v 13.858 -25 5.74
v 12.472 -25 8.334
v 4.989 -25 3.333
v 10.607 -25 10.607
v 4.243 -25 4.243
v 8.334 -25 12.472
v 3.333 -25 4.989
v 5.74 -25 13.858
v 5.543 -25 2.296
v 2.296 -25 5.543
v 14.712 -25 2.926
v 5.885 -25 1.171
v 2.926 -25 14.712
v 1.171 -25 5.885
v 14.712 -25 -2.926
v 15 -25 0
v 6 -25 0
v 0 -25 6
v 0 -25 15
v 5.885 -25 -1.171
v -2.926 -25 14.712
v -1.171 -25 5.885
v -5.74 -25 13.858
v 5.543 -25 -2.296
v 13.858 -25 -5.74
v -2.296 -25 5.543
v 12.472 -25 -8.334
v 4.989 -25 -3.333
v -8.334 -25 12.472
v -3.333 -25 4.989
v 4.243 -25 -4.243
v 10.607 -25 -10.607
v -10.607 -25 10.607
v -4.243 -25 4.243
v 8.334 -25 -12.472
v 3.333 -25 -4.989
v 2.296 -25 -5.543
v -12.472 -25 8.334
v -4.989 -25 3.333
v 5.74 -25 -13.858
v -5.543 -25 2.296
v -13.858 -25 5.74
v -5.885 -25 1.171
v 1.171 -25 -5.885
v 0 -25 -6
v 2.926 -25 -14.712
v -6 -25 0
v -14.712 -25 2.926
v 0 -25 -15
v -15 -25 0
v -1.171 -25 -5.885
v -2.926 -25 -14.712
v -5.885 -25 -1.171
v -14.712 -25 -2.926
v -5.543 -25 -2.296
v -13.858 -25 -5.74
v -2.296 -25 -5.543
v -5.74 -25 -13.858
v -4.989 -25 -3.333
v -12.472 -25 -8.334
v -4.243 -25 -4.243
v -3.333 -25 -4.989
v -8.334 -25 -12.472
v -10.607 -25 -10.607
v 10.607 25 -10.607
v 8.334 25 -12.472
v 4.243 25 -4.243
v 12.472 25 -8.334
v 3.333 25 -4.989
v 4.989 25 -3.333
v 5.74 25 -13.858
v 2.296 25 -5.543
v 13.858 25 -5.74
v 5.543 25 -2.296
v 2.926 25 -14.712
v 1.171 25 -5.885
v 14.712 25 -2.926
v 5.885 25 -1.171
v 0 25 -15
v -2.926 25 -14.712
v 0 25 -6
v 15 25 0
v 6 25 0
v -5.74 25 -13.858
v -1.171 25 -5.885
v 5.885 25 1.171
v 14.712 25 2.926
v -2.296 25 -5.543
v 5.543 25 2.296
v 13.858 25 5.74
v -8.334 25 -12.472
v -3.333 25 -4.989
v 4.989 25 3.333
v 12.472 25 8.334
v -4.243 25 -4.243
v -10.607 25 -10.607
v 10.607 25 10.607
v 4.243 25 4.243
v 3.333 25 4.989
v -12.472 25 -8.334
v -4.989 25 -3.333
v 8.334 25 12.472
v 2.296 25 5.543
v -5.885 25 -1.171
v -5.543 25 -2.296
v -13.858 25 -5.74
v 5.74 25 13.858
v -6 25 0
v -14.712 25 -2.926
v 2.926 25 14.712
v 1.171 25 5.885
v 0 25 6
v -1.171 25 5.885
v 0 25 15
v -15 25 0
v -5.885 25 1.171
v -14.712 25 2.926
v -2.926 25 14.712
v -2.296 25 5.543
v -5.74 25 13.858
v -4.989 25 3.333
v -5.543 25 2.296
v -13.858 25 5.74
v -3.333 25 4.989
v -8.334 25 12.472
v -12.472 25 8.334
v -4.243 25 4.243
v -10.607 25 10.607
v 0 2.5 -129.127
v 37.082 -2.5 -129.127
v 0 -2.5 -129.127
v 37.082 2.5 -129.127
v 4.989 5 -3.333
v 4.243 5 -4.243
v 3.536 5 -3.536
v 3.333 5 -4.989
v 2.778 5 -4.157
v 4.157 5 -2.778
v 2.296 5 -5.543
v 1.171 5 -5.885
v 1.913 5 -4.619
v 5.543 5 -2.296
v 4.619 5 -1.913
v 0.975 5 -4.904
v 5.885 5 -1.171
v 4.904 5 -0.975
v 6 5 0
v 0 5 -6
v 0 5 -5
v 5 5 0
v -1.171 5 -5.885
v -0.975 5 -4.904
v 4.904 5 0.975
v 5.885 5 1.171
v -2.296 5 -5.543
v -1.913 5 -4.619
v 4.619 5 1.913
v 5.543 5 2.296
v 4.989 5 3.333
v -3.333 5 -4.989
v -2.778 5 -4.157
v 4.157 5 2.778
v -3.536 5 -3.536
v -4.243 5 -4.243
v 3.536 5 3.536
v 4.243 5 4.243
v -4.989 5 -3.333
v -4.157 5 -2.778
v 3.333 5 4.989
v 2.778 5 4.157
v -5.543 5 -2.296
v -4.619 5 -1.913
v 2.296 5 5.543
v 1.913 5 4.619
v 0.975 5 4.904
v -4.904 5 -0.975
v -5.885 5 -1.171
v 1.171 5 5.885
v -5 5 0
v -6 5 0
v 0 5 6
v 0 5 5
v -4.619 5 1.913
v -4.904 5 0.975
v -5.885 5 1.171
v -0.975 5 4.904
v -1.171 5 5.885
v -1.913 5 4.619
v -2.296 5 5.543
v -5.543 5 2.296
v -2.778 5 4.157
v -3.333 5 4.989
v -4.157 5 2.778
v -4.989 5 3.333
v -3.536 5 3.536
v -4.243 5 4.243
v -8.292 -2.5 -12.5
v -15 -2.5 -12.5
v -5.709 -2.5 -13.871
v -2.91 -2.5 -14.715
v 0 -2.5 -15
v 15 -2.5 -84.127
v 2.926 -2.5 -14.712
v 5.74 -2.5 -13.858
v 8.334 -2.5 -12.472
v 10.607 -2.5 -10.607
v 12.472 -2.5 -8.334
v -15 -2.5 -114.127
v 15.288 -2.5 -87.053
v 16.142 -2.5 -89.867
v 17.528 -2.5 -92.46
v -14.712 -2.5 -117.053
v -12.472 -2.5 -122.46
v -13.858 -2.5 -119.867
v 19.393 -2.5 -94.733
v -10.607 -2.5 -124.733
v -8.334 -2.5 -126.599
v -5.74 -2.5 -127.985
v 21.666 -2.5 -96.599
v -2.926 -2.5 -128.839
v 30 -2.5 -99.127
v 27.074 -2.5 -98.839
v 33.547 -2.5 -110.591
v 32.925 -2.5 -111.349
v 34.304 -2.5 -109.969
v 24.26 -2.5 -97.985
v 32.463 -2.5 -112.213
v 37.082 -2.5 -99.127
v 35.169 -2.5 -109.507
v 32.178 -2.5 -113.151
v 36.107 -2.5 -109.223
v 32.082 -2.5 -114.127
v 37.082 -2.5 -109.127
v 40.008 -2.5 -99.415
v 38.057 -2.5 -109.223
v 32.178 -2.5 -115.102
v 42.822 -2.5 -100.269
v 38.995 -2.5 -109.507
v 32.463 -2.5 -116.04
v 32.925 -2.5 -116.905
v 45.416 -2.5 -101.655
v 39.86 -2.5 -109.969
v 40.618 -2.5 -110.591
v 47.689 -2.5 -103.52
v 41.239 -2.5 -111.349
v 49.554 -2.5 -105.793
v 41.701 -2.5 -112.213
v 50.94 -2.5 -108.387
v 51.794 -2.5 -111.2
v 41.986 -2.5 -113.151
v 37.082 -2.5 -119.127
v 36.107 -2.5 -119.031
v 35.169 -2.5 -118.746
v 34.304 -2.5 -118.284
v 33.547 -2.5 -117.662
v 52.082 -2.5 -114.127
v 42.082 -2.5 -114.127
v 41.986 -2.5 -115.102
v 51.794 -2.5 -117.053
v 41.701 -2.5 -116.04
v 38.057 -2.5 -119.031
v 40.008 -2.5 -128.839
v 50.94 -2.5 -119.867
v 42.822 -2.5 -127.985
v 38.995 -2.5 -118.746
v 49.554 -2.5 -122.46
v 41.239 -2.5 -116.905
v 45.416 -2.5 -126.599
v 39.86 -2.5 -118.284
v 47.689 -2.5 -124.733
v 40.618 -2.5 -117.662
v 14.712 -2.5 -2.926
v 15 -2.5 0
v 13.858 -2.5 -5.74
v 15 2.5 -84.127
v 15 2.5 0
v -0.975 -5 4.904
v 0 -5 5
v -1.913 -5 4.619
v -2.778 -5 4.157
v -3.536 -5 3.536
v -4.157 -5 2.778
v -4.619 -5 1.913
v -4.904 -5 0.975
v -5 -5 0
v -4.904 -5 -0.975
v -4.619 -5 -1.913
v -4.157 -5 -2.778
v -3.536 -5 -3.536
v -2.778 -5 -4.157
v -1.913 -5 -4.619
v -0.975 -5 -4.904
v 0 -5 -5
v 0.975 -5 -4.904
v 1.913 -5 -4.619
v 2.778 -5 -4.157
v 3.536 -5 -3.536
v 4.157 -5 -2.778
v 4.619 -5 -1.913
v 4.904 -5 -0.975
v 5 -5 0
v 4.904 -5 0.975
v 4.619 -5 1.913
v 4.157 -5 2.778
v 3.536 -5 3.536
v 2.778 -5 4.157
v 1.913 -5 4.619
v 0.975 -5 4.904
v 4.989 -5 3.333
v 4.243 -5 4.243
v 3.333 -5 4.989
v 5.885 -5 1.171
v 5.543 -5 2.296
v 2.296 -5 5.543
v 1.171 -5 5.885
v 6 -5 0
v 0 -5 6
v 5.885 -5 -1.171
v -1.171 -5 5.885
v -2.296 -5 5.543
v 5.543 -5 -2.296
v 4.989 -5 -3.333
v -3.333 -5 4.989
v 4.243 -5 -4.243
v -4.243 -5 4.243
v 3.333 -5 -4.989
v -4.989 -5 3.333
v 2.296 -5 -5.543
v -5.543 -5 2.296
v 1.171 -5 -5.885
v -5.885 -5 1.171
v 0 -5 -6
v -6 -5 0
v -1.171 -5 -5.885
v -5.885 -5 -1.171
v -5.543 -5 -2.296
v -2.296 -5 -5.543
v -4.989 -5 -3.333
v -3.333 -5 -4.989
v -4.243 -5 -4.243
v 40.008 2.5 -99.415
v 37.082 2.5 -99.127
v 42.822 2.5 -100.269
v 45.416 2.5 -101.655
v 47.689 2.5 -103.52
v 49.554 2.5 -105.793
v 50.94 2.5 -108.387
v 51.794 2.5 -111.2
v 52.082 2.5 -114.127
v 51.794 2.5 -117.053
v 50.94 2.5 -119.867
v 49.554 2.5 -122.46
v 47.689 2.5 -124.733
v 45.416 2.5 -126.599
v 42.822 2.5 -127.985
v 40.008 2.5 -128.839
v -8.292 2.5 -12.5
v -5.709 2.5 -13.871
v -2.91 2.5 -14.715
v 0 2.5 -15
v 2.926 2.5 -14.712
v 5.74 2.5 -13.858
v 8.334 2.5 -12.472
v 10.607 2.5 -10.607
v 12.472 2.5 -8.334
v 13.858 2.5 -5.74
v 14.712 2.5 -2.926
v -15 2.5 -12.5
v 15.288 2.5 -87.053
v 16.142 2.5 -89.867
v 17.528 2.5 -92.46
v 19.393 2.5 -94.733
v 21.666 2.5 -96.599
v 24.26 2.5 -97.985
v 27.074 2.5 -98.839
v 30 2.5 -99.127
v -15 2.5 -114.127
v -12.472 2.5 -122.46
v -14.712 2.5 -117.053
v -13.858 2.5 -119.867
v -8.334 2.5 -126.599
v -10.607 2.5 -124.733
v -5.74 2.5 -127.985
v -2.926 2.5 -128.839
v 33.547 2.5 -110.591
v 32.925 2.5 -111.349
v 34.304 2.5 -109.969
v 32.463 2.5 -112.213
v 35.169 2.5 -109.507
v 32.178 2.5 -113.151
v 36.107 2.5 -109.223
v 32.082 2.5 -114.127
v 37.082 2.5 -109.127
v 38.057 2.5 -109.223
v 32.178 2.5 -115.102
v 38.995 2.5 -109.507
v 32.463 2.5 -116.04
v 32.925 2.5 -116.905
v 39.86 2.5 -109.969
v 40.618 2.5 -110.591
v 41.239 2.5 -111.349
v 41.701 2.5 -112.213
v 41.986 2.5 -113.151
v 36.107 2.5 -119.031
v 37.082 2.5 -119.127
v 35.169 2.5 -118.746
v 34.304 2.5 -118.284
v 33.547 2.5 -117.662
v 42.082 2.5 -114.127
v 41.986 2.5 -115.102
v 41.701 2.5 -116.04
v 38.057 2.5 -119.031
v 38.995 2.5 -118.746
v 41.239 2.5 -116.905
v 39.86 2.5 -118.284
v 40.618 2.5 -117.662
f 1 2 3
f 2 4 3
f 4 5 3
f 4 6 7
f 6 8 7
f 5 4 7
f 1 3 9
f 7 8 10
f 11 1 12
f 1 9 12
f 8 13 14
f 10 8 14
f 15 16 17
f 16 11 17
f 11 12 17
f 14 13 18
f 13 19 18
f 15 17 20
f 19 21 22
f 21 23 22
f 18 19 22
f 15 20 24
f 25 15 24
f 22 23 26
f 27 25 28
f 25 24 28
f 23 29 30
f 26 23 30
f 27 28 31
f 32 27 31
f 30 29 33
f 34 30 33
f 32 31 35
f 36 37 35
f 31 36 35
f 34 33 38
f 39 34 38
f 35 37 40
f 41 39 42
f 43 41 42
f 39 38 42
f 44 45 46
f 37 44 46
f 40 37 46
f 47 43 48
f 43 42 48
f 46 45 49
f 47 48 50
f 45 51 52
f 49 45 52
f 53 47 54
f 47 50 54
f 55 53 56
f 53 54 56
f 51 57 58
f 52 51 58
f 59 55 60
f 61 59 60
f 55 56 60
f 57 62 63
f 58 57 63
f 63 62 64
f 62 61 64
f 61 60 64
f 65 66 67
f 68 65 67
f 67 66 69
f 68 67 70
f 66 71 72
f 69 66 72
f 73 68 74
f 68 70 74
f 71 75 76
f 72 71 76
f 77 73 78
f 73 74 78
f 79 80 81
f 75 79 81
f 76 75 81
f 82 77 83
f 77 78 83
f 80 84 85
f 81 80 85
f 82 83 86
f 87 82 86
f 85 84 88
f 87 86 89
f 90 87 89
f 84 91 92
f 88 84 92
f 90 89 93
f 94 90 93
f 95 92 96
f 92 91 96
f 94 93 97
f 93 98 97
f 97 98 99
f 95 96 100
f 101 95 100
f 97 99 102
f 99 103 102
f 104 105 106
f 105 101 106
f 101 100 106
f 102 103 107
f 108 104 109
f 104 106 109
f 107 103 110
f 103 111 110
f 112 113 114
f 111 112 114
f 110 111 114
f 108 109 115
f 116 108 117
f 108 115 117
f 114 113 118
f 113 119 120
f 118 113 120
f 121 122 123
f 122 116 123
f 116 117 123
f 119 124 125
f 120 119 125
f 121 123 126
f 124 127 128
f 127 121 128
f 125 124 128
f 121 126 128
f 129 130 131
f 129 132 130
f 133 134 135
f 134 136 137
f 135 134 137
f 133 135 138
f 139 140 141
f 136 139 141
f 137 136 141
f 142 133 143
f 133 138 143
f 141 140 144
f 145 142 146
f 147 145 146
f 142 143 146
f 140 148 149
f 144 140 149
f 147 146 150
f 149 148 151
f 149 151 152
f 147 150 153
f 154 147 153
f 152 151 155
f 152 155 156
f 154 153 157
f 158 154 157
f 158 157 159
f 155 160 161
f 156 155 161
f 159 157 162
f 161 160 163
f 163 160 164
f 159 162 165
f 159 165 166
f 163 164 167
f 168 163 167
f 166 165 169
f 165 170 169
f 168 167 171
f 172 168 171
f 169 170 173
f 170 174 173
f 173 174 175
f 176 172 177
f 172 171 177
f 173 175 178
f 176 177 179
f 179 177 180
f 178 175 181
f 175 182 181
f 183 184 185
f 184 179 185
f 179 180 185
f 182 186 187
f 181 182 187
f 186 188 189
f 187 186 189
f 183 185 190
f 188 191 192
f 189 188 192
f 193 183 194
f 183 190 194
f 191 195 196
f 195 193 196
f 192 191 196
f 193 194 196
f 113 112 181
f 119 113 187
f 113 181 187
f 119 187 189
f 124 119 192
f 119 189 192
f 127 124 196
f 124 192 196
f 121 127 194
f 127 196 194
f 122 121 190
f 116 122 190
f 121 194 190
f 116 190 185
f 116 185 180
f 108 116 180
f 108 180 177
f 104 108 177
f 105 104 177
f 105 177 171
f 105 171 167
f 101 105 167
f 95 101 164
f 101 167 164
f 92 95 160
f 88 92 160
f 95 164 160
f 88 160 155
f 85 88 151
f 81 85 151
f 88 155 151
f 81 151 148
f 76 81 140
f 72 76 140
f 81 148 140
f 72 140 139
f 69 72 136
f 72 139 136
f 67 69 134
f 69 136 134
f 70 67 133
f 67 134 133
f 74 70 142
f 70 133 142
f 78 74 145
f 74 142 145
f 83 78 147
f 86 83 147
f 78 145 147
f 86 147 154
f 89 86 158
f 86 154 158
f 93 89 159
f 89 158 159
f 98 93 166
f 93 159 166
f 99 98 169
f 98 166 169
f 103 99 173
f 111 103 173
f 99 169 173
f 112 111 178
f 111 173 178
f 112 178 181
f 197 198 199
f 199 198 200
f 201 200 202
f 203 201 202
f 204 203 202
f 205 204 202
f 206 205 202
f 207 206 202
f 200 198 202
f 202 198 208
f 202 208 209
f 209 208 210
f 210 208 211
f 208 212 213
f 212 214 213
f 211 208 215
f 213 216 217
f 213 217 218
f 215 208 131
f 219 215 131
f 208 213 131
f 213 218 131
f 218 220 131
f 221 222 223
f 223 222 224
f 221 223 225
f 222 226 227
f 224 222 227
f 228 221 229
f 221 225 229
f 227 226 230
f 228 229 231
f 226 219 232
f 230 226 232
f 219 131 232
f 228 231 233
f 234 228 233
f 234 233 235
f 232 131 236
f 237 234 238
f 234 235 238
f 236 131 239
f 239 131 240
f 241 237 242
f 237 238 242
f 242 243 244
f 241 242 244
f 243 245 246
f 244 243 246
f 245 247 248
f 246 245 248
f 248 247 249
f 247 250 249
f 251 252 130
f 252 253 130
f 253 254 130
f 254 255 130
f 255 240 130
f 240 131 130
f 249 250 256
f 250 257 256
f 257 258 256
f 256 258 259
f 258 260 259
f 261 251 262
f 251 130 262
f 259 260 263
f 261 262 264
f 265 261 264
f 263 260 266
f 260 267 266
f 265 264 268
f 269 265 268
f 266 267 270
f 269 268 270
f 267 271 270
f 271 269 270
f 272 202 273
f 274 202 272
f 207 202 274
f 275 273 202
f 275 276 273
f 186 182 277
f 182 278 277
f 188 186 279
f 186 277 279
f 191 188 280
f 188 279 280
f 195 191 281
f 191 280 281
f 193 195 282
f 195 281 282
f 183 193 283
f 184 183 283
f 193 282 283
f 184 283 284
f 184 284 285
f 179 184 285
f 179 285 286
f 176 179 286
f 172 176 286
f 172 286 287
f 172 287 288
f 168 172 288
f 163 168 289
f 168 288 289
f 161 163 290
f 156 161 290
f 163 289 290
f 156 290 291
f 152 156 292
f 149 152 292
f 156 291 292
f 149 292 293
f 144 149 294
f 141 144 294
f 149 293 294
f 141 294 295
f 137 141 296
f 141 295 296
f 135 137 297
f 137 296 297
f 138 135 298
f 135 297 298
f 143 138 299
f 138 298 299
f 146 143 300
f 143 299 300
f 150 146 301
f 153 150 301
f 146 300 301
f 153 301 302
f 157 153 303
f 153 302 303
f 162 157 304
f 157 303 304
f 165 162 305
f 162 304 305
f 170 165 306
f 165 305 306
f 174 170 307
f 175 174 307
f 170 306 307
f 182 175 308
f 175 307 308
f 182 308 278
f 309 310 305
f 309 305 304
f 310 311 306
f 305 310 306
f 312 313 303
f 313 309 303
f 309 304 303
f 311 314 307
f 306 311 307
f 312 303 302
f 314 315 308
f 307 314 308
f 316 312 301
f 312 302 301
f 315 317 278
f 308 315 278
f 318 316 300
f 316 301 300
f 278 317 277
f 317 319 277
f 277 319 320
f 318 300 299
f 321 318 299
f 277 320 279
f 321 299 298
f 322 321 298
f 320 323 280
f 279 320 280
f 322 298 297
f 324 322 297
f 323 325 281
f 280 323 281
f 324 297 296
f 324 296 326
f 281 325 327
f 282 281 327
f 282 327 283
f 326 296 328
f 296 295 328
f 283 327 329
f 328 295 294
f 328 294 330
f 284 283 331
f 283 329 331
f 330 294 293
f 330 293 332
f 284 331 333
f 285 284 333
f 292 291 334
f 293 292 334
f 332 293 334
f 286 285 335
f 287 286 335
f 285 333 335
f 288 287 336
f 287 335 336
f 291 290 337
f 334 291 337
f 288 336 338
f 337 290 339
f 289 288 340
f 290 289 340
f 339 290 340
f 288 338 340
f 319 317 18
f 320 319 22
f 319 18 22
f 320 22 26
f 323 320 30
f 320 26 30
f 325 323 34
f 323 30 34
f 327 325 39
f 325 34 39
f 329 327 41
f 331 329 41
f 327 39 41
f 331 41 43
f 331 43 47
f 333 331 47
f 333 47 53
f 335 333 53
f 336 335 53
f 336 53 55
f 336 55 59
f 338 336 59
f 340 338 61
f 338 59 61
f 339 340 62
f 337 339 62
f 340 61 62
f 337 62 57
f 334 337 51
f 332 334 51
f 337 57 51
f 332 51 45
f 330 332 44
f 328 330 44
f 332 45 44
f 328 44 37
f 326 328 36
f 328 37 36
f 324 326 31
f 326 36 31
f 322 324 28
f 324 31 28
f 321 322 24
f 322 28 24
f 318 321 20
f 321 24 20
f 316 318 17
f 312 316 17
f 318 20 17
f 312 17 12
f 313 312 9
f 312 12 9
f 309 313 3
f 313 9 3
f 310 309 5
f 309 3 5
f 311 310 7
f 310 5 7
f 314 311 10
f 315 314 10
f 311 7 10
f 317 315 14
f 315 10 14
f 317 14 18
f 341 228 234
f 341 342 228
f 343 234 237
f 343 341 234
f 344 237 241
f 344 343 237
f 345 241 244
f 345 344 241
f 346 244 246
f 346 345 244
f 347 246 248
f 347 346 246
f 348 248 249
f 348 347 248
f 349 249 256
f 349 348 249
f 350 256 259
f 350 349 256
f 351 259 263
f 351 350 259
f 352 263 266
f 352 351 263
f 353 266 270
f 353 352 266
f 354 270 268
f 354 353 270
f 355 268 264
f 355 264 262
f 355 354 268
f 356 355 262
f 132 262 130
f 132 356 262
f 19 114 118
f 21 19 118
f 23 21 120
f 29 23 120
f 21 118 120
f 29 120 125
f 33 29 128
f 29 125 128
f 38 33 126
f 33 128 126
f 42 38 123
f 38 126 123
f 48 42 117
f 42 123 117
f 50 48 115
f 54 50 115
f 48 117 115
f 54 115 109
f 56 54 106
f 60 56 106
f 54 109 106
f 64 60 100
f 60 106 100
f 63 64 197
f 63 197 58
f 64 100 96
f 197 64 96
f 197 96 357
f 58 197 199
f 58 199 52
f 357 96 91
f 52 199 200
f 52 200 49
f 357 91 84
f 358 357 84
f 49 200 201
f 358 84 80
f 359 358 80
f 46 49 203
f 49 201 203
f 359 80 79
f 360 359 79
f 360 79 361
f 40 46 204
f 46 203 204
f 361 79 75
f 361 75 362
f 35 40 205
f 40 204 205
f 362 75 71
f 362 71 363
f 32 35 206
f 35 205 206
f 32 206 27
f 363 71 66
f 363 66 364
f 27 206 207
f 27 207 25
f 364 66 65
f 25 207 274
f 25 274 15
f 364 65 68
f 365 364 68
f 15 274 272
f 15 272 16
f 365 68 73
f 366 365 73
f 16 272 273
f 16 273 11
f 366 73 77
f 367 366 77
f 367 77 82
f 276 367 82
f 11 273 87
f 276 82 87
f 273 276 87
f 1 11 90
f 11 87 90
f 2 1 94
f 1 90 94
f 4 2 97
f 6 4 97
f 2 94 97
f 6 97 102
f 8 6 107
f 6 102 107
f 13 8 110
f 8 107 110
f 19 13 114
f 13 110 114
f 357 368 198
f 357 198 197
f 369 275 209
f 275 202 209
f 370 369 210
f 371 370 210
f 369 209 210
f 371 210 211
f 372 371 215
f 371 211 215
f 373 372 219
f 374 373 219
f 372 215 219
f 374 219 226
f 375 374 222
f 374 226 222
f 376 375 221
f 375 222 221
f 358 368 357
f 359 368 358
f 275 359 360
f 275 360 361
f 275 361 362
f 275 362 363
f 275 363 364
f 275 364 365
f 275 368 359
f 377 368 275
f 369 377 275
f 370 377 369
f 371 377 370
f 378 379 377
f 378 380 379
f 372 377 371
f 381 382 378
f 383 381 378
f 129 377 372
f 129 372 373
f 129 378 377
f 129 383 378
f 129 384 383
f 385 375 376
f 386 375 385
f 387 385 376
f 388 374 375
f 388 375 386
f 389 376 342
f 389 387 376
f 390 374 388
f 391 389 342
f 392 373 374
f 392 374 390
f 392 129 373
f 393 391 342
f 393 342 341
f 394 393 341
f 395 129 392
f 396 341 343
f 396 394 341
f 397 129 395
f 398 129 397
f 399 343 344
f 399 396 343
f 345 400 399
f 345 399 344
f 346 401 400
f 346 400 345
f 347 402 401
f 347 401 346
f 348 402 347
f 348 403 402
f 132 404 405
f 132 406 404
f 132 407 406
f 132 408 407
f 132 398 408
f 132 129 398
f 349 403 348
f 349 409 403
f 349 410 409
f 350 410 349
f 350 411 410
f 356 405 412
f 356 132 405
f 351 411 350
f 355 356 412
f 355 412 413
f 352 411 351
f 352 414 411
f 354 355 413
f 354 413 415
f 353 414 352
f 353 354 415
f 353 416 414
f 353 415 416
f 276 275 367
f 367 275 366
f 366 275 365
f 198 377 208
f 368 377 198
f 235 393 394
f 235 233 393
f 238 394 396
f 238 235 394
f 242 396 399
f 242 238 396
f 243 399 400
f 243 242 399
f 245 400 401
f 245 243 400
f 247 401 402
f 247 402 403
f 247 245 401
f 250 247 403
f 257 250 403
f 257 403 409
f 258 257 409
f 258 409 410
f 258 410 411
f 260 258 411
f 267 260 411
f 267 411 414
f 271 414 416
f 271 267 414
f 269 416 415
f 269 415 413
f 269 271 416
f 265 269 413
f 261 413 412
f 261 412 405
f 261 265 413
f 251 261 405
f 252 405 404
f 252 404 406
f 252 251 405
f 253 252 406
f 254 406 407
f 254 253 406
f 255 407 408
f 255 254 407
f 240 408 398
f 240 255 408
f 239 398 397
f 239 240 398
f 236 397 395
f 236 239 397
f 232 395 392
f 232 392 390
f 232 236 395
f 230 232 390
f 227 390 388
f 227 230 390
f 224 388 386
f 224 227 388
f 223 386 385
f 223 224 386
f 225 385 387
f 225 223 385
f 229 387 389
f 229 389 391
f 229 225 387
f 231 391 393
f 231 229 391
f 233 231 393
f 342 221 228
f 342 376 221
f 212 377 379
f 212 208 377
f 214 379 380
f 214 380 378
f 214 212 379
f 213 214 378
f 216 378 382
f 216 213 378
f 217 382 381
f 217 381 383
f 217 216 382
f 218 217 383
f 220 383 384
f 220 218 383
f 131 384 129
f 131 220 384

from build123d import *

# Parameters (mm, degrees)
SKETCH7_R           = 5
BOSS_EXTRUDE1_DEPTH = 2.5
FILLET3_R           = 15


with BuildPart() as part:
    # Sketch4 → Revolve1 (revolve)
    with BuildSketch(Plane.XY, mode=Mode.PRIVATE) as revolve1_sk:
        Polygon((5, 5), (5, -5), (6, -5), (6, -25), (15, -25), (15, 25), (6, 25), (6, 5), align=None)
    revolve(revolve1_sk.sketch.rotate(Axis((0, 25, 0), (0, -1, 0)), 90), axis=Axis((0, 25, 0), (0, -1, 0)))

    # Sketch7 → Boss-Extrude1 (add, symmetric)
    with BuildSketch(Plane(origin=(0, 0, 0), x_dir=(1, 0, 0), z_dir=(0, 1, 0))):
        with BuildLine():
            Line((-15, 129.126781955), (-15, 12.5))
            Line((-15, 12.5), (-8.291561976, 12.5))
            ThreePointArc((-8.291561976, 12.5), (-4.330127019, 14.361406616), (0, 15))
            ThreePointArc((0, 15), (10.606601718, 10.606601718), (15, 0))
            Line((15, 0), (15, 99.126781955))
            Line((15, 99.126781955), (37.082039325, 99.126781955))
            ThreePointArc((37.082039325, 99.126781955), (52.082039325, 114.126781955), (37.082039325, 129.126781955))
            Line((37.082039325, 129.126781955), (-15, 129.126781955))
        make_face()
        with Locations(Location((37.082039325, 114.126781955, 0), (0, 0, 270))):
            Circle(SKETCH7_R, mode=Mode.SUBTRACT)
    extrude(amount=BOSS_EXTRUDE1_DEPTH, both=True)

    # Fillet3
    fillet3_edges = [part.edges().sort_by_distance(p)[0] for p in [
        (15, 0, -99.126781955),
        (-15, 0, -129.126781955),
    ]]
    fillet(fillet3_edges, radius=FILLET3_R)


solid = part.part
